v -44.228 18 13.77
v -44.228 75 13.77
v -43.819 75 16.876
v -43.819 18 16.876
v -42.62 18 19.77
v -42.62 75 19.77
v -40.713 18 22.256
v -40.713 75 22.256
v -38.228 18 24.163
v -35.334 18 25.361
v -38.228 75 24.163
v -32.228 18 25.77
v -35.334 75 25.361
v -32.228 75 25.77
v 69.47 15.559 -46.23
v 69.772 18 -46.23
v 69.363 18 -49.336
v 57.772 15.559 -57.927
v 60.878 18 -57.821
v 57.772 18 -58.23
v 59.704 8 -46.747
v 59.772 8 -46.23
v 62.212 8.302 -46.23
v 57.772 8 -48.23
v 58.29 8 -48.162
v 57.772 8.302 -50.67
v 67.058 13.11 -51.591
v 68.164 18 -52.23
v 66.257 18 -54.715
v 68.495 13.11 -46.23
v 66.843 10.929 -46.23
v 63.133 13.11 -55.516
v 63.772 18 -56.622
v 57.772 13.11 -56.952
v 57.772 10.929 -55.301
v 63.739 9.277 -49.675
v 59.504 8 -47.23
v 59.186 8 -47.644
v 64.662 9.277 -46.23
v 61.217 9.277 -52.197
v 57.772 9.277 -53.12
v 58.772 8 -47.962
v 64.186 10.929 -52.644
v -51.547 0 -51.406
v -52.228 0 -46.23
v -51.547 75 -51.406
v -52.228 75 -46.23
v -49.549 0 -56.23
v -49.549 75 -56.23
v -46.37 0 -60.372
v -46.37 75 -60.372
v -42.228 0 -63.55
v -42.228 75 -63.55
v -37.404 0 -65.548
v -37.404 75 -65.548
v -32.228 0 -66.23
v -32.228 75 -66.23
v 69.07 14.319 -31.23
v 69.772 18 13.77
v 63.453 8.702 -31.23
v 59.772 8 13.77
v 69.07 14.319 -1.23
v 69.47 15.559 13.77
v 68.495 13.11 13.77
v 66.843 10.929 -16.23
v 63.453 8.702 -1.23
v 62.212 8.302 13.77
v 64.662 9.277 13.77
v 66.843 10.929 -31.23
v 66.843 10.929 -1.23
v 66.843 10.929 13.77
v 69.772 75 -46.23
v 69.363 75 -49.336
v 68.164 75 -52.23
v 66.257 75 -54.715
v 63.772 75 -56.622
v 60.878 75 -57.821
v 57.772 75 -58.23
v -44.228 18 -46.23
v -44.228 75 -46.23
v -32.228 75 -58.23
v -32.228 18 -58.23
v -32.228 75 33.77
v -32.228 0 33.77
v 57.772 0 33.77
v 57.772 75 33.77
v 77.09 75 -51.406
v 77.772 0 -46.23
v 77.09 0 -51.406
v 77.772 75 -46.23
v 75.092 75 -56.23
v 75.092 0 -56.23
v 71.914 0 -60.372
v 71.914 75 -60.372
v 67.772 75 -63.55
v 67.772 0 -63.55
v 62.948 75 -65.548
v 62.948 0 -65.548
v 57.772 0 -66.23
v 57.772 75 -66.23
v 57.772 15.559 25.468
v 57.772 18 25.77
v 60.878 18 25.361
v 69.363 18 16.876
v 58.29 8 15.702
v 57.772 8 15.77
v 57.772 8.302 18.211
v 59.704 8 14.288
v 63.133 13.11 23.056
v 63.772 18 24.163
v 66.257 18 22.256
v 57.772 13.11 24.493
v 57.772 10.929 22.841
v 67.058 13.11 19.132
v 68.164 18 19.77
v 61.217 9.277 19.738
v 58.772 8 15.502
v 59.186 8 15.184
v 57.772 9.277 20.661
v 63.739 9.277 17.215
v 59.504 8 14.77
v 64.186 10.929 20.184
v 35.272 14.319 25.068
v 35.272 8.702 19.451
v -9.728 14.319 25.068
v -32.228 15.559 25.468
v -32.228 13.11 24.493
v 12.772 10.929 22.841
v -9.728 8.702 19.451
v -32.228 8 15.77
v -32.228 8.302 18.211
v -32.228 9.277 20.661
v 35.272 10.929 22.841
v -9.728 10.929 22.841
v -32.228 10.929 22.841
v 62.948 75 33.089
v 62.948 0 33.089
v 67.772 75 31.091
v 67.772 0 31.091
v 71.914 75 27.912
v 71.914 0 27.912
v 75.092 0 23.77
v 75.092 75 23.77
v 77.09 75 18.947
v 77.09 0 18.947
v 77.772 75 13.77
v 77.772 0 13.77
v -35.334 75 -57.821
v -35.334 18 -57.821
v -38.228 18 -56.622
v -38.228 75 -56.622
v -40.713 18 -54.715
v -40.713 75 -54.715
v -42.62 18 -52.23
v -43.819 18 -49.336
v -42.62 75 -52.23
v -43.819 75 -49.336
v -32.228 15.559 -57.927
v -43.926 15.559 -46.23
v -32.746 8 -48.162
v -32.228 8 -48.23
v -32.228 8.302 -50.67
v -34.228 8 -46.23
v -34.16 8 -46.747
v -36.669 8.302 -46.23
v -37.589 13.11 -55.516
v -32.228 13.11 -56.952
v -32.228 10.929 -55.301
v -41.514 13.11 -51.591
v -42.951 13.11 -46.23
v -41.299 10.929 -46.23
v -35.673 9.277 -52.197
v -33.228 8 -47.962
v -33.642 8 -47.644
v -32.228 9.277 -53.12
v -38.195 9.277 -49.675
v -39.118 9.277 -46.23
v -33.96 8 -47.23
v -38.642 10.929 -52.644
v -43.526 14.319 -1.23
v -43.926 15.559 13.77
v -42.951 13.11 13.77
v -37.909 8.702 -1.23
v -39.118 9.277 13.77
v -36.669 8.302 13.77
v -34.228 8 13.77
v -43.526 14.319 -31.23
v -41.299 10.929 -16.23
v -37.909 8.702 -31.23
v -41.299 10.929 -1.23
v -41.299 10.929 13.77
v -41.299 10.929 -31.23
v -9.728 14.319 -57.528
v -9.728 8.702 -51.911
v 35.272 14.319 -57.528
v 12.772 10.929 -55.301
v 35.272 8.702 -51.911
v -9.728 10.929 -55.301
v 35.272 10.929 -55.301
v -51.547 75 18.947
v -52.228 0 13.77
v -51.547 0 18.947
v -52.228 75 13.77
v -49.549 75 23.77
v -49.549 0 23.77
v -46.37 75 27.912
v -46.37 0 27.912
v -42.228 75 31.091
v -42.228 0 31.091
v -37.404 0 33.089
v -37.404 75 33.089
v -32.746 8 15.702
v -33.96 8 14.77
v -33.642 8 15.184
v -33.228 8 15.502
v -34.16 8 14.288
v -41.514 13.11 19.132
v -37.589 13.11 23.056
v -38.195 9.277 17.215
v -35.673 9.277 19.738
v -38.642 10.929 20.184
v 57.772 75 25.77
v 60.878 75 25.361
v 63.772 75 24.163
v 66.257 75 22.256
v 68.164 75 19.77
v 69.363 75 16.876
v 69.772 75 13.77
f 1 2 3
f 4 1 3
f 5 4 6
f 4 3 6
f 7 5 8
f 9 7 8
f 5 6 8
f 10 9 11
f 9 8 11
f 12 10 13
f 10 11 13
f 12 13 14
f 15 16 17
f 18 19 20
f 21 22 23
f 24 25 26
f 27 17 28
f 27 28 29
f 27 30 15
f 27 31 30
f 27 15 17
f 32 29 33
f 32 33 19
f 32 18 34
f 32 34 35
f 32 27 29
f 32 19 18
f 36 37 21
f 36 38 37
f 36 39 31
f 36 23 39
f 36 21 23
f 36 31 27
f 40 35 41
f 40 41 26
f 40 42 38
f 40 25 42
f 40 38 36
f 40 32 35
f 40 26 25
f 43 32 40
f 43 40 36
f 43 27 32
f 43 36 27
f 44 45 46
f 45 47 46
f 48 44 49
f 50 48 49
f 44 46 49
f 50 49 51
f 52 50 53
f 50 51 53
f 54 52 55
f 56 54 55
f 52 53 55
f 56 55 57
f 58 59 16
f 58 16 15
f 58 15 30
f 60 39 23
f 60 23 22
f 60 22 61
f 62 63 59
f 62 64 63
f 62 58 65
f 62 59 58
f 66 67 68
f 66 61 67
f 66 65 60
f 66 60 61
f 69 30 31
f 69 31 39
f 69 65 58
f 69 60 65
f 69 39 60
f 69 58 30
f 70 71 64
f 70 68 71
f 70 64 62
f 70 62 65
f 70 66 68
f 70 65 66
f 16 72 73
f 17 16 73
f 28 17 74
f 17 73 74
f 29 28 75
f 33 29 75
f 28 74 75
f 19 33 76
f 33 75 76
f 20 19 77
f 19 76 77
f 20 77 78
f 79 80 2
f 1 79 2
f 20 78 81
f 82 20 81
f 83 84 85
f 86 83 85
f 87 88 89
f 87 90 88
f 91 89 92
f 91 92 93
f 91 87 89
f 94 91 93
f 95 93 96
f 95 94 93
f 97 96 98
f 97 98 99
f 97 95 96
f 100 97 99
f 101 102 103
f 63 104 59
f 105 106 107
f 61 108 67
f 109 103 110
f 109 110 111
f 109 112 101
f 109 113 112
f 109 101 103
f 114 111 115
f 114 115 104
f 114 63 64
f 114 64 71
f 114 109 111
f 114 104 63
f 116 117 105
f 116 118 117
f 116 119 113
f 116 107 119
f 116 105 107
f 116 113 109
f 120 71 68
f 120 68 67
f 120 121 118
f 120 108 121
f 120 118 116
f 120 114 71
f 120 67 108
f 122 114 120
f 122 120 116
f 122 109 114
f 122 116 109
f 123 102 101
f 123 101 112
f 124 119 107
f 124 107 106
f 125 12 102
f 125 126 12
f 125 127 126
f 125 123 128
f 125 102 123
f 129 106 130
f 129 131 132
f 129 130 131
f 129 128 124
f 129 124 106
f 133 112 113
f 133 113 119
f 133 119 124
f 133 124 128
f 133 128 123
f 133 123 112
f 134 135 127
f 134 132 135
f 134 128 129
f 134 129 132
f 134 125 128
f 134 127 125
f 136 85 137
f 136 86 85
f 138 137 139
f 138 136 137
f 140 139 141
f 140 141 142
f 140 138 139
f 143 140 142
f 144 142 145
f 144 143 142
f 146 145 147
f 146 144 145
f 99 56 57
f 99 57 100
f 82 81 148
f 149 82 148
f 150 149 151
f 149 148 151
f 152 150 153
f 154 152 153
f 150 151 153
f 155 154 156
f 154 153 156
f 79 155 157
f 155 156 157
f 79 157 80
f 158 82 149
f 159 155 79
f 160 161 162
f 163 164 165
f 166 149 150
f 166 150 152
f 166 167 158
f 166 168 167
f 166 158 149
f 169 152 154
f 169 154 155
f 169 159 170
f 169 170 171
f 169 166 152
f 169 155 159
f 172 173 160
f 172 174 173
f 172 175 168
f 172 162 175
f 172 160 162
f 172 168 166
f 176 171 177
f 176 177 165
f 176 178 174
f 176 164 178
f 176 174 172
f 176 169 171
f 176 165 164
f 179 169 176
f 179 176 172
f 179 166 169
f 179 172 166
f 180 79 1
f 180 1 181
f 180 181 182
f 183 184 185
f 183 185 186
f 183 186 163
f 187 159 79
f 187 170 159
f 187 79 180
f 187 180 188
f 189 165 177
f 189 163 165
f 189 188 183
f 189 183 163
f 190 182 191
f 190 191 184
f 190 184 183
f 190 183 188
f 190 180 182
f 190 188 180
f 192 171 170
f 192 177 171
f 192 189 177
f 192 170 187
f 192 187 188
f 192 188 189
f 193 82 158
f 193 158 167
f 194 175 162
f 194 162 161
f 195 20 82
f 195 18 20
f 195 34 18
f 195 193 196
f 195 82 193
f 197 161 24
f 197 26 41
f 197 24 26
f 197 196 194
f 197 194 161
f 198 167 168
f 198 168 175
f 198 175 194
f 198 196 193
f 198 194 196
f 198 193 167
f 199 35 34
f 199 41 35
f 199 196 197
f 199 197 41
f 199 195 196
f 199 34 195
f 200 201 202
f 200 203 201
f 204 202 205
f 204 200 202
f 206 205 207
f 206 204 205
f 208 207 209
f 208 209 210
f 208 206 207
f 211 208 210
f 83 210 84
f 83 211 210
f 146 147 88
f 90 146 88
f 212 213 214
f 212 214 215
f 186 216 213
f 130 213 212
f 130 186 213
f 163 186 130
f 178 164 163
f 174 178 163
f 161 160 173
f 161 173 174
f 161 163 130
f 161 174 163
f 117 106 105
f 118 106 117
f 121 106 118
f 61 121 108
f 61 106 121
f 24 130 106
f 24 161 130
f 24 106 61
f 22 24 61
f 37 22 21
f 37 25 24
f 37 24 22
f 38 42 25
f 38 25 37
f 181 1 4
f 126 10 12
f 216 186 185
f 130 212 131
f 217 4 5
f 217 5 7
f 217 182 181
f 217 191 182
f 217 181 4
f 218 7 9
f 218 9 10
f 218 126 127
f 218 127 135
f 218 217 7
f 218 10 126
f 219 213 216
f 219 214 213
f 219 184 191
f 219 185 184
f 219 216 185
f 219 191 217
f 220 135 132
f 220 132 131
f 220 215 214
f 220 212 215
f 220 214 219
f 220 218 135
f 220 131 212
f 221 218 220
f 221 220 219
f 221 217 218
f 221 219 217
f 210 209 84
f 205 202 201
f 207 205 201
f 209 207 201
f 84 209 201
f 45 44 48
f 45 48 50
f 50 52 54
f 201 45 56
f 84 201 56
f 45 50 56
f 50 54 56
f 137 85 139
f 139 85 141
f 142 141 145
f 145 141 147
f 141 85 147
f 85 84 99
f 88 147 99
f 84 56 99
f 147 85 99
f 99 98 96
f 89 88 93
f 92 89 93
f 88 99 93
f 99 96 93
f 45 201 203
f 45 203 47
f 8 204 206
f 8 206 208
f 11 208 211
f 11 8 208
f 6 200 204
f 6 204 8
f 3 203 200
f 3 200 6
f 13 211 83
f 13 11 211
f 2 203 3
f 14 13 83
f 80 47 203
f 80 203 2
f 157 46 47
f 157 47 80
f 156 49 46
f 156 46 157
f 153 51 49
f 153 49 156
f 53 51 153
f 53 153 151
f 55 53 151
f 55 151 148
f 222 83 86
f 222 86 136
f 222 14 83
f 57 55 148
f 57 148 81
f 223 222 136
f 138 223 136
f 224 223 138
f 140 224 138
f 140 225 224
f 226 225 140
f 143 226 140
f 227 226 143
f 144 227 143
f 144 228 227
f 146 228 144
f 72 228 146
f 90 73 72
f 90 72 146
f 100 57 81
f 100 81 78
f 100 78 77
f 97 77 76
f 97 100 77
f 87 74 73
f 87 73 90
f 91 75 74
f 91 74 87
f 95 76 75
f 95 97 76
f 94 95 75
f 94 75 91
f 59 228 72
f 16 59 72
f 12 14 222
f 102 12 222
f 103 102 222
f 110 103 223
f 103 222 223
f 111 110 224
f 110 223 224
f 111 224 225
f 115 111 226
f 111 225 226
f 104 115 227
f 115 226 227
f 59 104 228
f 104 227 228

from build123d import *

# Parameters (mm, degrees)
ESQUISSE4_W             = 130
ESQUISSE4_H             = 100
BOSS_EXTRU_4_DEPTH      = 75
CONG_5_R                = 20
ENL_V_MAT_EXTRU_1_DEPTH = 67
CONG_6_SIZE             = 10


with BuildPart() as part:
    # Esquisse4 → Boss.-Extru.4 (new body)
    with BuildSketch(Plane(origin=(0, 0, 0), x_dir=(1, 0, 0), z_dir=(0, 1, 0))):
        with Locations((12.771948074, 16.229726537)):
            Rectangle(ESQUISSE4_W, ESQUISSE4_H)
    extrude(amount=BOSS_EXTRU_4_DEPTH)

    # Congé5
    cong_5_edges = [part.edges().sort_by_distance(p)[0] for p in [
        (-52.228051926, 37.5, -66.229726537),
        (77.771948074, 37.5, -66.229726537),
        (77.771948074, 37.5, 33.770273463),
        (-52.228051926, 37.5, 33.770273463),
    ]]
    fillet(cong_5_edges, radius=CONG_5_R)

    # Esquisse5 → Enlèv. mat.-Extru.1 (cut)
    with BuildSketch(Plane(origin=(0, 75, 0), x_dir=(1, 0, 0), z_dir=(0, 1, 0))):
        with BuildLine():
            Line((57.771948074, 58.229726537), (-32.228051926, 58.229726537))
            ThreePointArc((-32.228051926, 58.229726537), (-40.713333301, 54.715007912), (-44.228051926, 46.229726537))
            Line((-44.228051926, 46.229726537), (-44.228051926, -13.770273463))
            ThreePointArc((-44.228051926, -13.770273463), (-40.713333301, -22.255554837), (-32.228051926, -25.770273463))
            Line((-32.228051926, -25.770273463), (57.771948074, -25.770273463))
            ThreePointArc((57.771948074, -25.770273463), (66.257229448, -22.255554837), (69.771948074, -13.770273463))
            Line((69.771948074, -13.770273463), (69.771948074, 46.229726537))
            ThreePointArc((69.771948074, 46.229726537), (66.257229448, 54.715007912), (57.771948074, 58.229726537))
        make_face()
    extrude(amount=-ENL_V_MAT_EXTRU_1_DEPTH, mode=Mode.SUBTRACT)

    # Congé6
    # a fillet whose section is not a circle: 10 mm, written as the material it adds along each edge
    with BuildSketch(Plane(origin=(57.771948074, 8, -46.229726537), x_dir=(1, 0, 0), z_dir=(0, 0, 1))) as cong_6_piece_1:
        with BuildLine():
            Bezier((12, CONG_6_SIZE), (12, 0), (12 - CONG_6_SIZE, 0), weights=[1, 0.707106781, 1])
            Line((12 - CONG_6_SIZE, 0), (12, 0))
            Line((12, 0), (12, CONG_6_SIZE))
        make_face()
    revolve(axis=Axis((57.771948074, 8, -46.229726537), (0, 1, 0)), revolution_arc=90)
    with BuildSketch(Plane(origin=(69.771948074, 8, 13.770273463), x_dir=(0, 1, 0), z_dir=(0, 0, -1)), Plane(origin=(-44.228051926, 8, -46.229726537), x_dir=(0, 1, 0), z_dir=(0, 0, 1))) as cong_6_piece_2:
        with BuildLine():
            Bezier((CONG_6_SIZE, 0), (0, 0), (0, -CONG_6_SIZE), weights=[1, 0.707106781, 1])
            Line((0, -CONG_6_SIZE), (0, 0))
            Line((0, 0), (CONG_6_SIZE, 0))
        make_face()
    extrude(amount=60)
    with BuildSketch(Plane(origin=(57.771948074, 8, 13.770273463), x_dir=(0, 0, 1), z_dir=(-1, 0, 0))) as cong_6_piece_3:
        with BuildLine():
            Bezier((12, CONG_6_SIZE), (12, 0), (12 - CONG_6_SIZE, 0), weights=[1, 0.707106781, 1])
            Line((12 - CONG_6_SIZE, 0), (12, 0))
            Line((12, 0), (12, CONG_6_SIZE))
        make_face()
    revolve(axis=Axis((57.771948074, 8, 13.770273463), (0, 1, 0)), revolution_arc=90)
    with BuildSketch(Plane(origin=(-32.228051926, 8, 25.770273463), x_dir=(0, 1, 0), z_dir=(1, 0, 0)), Plane(origin=(57.771948074, 8, -58.229726537), x_dir=(0, 1, 0), z_dir=(-1, 0, 0))) as cong_6_piece_4:
        with BuildLine():
            Bezier((CONG_6_SIZE, 0), (0, 0), (0, -CONG_6_SIZE), weights=[1, 0.707106781, 1])
            Line((0, -CONG_6_SIZE), (0, 0))
            Line((0, 0), (CONG_6_SIZE, 0))
        make_face()
    extrude(amount=90)
    with BuildSketch(Plane(origin=(-32.228051926, 8, 13.770273463), x_dir=(-1, 0, 0), z_dir=(0, 0, -1))) as cong_6_piece_5:
        with BuildLine():
            Bezier((12, CONG_6_SIZE), (12, 0), (12 - CONG_6_SIZE, 0), weights=[1, 0.707106781, 1])
            Line((12 - CONG_6_SIZE, 0), (12, 0))
            Line((12, 0), (12, CONG_6_SIZE))
        make_face()
    revolve(axis=Axis((-32.228051926, 8, 13.770273463), (0, 1, 0)), revolution_arc=90)
    with BuildSketch(Plane(origin=(-32.228051926, 8, -46.229726537), x_dir=(0, 0, -1), z_dir=(1, 0, 0))) as cong_6_piece_6:
        with BuildLine():
            Bezier((12, CONG_6_SIZE), (12, 0), (12 - CONG_6_SIZE, 0), weights=[1, 0.707106781, 1])
            Line((12 - CONG_6_SIZE, 0), (12, 0))
            Line((12, 0), (12, CONG_6_SIZE))
        make_face()
    revolve(axis=Axis((-32.228051926, 8, -46.229726537), (0, 1, 0)), revolution_arc=90)


solid = part.part
